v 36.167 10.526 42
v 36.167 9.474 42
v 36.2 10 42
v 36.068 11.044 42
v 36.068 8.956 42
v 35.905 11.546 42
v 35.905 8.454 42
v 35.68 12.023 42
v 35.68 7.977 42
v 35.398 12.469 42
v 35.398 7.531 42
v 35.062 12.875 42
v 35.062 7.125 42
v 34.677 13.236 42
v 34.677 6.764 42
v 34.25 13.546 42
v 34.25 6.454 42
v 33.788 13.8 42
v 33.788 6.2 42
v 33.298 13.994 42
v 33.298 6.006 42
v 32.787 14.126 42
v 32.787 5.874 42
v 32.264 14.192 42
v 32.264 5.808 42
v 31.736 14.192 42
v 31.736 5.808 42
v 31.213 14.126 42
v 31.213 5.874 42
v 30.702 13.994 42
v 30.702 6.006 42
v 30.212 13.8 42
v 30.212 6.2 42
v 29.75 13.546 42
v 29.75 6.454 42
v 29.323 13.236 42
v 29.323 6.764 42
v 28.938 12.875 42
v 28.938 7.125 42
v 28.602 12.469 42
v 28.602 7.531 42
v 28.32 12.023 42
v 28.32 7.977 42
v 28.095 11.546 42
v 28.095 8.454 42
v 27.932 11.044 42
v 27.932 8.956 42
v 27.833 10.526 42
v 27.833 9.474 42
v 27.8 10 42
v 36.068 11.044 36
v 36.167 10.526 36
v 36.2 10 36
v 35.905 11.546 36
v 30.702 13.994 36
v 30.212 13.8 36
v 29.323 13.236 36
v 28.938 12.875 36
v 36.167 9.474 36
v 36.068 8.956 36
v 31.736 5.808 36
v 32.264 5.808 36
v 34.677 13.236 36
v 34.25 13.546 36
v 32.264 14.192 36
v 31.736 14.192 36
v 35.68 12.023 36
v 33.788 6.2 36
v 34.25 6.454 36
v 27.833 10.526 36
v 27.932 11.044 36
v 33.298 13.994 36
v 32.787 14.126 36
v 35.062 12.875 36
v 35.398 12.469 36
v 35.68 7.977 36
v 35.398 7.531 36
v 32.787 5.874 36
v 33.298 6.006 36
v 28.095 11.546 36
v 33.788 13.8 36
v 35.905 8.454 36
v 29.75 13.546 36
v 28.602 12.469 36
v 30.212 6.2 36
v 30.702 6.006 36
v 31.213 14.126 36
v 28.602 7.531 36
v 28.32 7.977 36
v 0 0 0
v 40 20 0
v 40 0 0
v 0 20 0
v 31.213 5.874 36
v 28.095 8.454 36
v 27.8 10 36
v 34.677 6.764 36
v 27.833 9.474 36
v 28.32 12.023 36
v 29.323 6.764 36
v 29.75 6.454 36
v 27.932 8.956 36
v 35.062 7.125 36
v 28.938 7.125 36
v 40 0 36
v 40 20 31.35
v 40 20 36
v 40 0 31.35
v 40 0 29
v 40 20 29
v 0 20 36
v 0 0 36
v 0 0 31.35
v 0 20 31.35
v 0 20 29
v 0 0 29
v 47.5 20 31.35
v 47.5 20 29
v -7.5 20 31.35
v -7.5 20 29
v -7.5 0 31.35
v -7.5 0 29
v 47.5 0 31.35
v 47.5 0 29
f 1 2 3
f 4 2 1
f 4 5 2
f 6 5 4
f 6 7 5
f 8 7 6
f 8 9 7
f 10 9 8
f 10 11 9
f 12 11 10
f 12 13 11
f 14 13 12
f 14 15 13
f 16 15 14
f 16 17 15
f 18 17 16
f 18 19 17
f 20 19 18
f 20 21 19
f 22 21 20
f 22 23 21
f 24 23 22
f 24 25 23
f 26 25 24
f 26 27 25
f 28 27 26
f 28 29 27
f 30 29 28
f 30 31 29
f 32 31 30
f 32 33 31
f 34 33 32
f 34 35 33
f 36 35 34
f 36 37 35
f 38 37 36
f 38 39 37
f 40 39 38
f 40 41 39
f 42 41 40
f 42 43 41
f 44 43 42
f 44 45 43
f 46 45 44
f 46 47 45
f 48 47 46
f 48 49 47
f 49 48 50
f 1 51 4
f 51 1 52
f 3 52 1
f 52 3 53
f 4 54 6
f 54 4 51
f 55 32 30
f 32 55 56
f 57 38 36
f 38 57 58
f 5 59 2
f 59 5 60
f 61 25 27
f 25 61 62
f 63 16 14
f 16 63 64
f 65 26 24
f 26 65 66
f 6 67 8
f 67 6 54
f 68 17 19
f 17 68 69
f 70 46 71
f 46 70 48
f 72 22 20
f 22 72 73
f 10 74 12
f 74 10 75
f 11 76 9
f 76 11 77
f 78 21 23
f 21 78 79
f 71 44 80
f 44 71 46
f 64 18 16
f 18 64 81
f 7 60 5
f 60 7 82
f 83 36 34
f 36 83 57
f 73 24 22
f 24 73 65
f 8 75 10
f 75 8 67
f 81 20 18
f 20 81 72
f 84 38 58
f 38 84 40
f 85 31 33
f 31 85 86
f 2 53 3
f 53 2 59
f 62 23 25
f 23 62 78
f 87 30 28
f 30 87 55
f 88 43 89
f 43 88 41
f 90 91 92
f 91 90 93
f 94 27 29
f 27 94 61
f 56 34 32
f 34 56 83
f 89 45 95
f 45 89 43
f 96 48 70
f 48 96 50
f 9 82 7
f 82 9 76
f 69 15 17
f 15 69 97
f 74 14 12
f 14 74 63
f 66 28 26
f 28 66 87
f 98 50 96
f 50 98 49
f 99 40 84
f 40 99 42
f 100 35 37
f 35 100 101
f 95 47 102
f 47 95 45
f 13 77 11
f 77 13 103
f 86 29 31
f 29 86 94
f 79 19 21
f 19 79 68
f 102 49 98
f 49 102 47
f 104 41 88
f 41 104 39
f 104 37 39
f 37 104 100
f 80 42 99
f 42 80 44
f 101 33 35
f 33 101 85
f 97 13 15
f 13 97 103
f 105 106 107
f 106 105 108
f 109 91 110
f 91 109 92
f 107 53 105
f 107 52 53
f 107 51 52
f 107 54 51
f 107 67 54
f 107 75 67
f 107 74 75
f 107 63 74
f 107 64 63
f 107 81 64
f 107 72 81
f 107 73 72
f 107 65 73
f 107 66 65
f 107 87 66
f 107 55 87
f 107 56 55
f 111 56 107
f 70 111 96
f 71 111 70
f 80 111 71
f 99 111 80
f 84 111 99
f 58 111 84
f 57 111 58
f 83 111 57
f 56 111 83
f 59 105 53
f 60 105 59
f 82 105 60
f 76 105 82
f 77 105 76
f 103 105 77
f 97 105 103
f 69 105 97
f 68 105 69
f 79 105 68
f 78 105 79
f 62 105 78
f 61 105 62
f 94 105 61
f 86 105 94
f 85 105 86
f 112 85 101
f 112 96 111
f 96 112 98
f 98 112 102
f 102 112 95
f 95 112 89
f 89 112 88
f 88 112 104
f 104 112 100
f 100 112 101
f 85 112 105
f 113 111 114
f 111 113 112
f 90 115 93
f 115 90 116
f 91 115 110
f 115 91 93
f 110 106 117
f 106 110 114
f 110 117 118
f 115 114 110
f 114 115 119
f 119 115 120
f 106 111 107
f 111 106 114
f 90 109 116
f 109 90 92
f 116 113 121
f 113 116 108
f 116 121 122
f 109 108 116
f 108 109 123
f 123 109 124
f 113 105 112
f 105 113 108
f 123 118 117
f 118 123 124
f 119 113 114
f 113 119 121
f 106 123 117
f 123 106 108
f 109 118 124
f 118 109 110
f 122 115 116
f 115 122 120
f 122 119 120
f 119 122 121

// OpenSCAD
//nuts etc
/*
 *  OpenSCAD Metric Fastners Library (www.openscad.org)
 *  Copyright (C) 2010-2011  Giles Bathgate
 *
 *  This program is free software; you can redistribute it and/or modify
 *  it under the terms of the GNU General Public License as published by
 *  the Free Software Foundation; either version 3 of the License,
 *  LGPL version 2.1, or (at your option) any later version of the GPL.
 *
 *  This program is distributed in the hope that it will be useful,
 *  but WITHOUT ANY WARRANTY; without even the implied warranty of
 *  MERCHANTABILITY or FITNESS FOR A PARTICULAR PURPOSE.  See the
 *  GNU General Public License for more details.
 *
 *  You should have received a copy of the GNU General Public License
 *  along with this program; if not, write to the Free Software
 *  Foundation, Inc., 59 Temple Place, Suite 330, Boston, MA 02111-1307 USA
 *
*/

$fn=50;
apply_chamfer=true;

module cap_bolt(dia,len)
{
	e=1.5*dia;
	h1=1.25*dia;
	cylinder(r=dia/2,h=len);
	translate([0,0,-h1]) cylinder(r=e/2,h=h1);
}

module csk_bolt(dia,len)
{
	h1=0.6*dia;
	h2=len-h1;
	cylinder(r=dia/2,h=h2);
	cylinder(r1=dia,r2=dia/2,h=h1);
}

module washer(dia)
{
	t=0.1*dia;
	difference()
	{
		cylinder(r=dia,h=t);
		translate([0,0,-t/2])cylinder(r=dia/2,h=t*2);
	}
}

module flat_nut(dia)
{
	m=0.8*dia;
	e=1.8*dia;
	c=0.2*dia;
	difference()
	{
		cylinder(r=e/2,h=m,$fn=6);
		translate([0,0,-m/2])cylinder(r=dia/2,h=m*2);
		if(apply_chamfer)
		    translate([0,0,c])cylinder_chamfer(e/2,c);
	}
}

module bolt(dia,len)
{
	e=1.8*dia;
	k=0.7*dia;
	c=0.2*dia;
	difference()
	{
		cylinder(r=e/2,h=k,$fn=6);
		if(apply_chamfer)
		    translate([0,0,c])cylinder_chamfer(e/2,c);
	}

	cylinder(r=dia/2,h=len);

}

module cylinder_chamfer(r1,r2)
{
	t=r1-r2;
	p=r2*2;
	rotate_extrude()
	difference()
	{
		translate([t,-p])square([p,p]);
		translate([t,0])circle(r2);
	}
}

module chamfer(len,r)
{
	p=r*2;
	linear_extrude(height=len)
	difference()
	{
		square([p,p]);
		circle(r);
	}
}

union()
{
//csk_bolt(3,14);
//washer(3);
//flat_nut(3);
//bolt(4,14);
//cylinder_chamfer(8,1);
//chamfer(10,2);
}


//nuts etc


//Camera mount
include <./Pulley_T-MXL-XL-HTD-GT2_N-tooth.scad>

module base_plate(){
difference(){
union(){
cube([80,25,75]);
translate([80/2,25/2,0]){cylinder(h = 5, r=28, $fs=1);}

translate([-3,25/2,80-16/2]){rotate([90,0,90]){#cylinder(h = 8, r=16, $fs=1);}}
translate([80-5,25/2,80-16/2]){rotate([90,0,90]){#cylinder(h = 8, r=16, $fs=1);}}
}
translate([5,0,5])cube([70,25,75]);

//holes for side bearings
translate([0-3,25/2,80-16/2]){rotate([90,0,90]){#cylinder(h = 7, r=22.4/2, $fs=1);}}
translate([80-4,25/2,80-16/2]){rotate([90,0,90]){#cylinder(h = 7, r=22.4/2, $fs=1);}}

//holes for bolts on side bearings
translate([0-6,25/2,80-16/2]){rotate([90,0,90]){#cylinder(h = 12, r=8.4/2, $fs=1);}}
translate([80-6,25/2,80-16/2]){rotate([90,0,90]){#cylinder(h = 12, r=8.4/2, $fs=1);}}


//bottom strengthening plate
translate([80/2,25/2,-14]){cylinder(h = 20, r=8/2, $fs=1);}

//connecting holes to gear
#translate([(80/2)-15,25/2,-14]){cylinder(h = 20, r=2, $fs=1);}
#translate([(80/2)+15,25/2,-14]){cylinder(h = 20, r=2, $fs=1);}
}
}

module gear_module(){
difference(){
translate([80/2,25/2,-9]){pulley ( "T5" , T5_pulley_dia , 1.19 , 3.264 );}
#translate([(80/2)-15,25/2,-14]){cylinder(h = 20, r=2, $fs=1);}
#translate([(80/2)+15,25/2,-14]){cylinder(h = 20, r=2, $fs=1);}
}
}

module bottom_plate(){
difference(){
union(){
translate([80/2,25/2,-25]){cylinder(h = 12, r=22, $fs=1);}
translate([80/2,-15,-25]){rotate([0,0,30]){cube([80,50,10]);}}
}
translate([80/2,25/2,-20]){cylinder(h = 7, r=22.4/2, $fs=1);}
translate([80/2,25/2,-30]){#cylinder(h = 20, r=8.4/2, $fs=1);}

translate([80/2,25/2,-25]){flat_nut(8);}
}
}

module bottom_motor_house(){
difference(){
union(){
//translate([80/2,50,-45]){cube([40,20,36]);}
translate([32,20/2,0]){#cylinder(h = 36+6, r=8.4/2, $fs=1);}
#cube([40,20,36]);
translate([(40-55)/2,0,29]){#cube([55,20,2.35]);}

}
}
}

//base_plate();
//gear_module();
//translate([55,30,-45]){rotate([0,0,-10]){
bottom_motor_house();
//bottom_plate();
